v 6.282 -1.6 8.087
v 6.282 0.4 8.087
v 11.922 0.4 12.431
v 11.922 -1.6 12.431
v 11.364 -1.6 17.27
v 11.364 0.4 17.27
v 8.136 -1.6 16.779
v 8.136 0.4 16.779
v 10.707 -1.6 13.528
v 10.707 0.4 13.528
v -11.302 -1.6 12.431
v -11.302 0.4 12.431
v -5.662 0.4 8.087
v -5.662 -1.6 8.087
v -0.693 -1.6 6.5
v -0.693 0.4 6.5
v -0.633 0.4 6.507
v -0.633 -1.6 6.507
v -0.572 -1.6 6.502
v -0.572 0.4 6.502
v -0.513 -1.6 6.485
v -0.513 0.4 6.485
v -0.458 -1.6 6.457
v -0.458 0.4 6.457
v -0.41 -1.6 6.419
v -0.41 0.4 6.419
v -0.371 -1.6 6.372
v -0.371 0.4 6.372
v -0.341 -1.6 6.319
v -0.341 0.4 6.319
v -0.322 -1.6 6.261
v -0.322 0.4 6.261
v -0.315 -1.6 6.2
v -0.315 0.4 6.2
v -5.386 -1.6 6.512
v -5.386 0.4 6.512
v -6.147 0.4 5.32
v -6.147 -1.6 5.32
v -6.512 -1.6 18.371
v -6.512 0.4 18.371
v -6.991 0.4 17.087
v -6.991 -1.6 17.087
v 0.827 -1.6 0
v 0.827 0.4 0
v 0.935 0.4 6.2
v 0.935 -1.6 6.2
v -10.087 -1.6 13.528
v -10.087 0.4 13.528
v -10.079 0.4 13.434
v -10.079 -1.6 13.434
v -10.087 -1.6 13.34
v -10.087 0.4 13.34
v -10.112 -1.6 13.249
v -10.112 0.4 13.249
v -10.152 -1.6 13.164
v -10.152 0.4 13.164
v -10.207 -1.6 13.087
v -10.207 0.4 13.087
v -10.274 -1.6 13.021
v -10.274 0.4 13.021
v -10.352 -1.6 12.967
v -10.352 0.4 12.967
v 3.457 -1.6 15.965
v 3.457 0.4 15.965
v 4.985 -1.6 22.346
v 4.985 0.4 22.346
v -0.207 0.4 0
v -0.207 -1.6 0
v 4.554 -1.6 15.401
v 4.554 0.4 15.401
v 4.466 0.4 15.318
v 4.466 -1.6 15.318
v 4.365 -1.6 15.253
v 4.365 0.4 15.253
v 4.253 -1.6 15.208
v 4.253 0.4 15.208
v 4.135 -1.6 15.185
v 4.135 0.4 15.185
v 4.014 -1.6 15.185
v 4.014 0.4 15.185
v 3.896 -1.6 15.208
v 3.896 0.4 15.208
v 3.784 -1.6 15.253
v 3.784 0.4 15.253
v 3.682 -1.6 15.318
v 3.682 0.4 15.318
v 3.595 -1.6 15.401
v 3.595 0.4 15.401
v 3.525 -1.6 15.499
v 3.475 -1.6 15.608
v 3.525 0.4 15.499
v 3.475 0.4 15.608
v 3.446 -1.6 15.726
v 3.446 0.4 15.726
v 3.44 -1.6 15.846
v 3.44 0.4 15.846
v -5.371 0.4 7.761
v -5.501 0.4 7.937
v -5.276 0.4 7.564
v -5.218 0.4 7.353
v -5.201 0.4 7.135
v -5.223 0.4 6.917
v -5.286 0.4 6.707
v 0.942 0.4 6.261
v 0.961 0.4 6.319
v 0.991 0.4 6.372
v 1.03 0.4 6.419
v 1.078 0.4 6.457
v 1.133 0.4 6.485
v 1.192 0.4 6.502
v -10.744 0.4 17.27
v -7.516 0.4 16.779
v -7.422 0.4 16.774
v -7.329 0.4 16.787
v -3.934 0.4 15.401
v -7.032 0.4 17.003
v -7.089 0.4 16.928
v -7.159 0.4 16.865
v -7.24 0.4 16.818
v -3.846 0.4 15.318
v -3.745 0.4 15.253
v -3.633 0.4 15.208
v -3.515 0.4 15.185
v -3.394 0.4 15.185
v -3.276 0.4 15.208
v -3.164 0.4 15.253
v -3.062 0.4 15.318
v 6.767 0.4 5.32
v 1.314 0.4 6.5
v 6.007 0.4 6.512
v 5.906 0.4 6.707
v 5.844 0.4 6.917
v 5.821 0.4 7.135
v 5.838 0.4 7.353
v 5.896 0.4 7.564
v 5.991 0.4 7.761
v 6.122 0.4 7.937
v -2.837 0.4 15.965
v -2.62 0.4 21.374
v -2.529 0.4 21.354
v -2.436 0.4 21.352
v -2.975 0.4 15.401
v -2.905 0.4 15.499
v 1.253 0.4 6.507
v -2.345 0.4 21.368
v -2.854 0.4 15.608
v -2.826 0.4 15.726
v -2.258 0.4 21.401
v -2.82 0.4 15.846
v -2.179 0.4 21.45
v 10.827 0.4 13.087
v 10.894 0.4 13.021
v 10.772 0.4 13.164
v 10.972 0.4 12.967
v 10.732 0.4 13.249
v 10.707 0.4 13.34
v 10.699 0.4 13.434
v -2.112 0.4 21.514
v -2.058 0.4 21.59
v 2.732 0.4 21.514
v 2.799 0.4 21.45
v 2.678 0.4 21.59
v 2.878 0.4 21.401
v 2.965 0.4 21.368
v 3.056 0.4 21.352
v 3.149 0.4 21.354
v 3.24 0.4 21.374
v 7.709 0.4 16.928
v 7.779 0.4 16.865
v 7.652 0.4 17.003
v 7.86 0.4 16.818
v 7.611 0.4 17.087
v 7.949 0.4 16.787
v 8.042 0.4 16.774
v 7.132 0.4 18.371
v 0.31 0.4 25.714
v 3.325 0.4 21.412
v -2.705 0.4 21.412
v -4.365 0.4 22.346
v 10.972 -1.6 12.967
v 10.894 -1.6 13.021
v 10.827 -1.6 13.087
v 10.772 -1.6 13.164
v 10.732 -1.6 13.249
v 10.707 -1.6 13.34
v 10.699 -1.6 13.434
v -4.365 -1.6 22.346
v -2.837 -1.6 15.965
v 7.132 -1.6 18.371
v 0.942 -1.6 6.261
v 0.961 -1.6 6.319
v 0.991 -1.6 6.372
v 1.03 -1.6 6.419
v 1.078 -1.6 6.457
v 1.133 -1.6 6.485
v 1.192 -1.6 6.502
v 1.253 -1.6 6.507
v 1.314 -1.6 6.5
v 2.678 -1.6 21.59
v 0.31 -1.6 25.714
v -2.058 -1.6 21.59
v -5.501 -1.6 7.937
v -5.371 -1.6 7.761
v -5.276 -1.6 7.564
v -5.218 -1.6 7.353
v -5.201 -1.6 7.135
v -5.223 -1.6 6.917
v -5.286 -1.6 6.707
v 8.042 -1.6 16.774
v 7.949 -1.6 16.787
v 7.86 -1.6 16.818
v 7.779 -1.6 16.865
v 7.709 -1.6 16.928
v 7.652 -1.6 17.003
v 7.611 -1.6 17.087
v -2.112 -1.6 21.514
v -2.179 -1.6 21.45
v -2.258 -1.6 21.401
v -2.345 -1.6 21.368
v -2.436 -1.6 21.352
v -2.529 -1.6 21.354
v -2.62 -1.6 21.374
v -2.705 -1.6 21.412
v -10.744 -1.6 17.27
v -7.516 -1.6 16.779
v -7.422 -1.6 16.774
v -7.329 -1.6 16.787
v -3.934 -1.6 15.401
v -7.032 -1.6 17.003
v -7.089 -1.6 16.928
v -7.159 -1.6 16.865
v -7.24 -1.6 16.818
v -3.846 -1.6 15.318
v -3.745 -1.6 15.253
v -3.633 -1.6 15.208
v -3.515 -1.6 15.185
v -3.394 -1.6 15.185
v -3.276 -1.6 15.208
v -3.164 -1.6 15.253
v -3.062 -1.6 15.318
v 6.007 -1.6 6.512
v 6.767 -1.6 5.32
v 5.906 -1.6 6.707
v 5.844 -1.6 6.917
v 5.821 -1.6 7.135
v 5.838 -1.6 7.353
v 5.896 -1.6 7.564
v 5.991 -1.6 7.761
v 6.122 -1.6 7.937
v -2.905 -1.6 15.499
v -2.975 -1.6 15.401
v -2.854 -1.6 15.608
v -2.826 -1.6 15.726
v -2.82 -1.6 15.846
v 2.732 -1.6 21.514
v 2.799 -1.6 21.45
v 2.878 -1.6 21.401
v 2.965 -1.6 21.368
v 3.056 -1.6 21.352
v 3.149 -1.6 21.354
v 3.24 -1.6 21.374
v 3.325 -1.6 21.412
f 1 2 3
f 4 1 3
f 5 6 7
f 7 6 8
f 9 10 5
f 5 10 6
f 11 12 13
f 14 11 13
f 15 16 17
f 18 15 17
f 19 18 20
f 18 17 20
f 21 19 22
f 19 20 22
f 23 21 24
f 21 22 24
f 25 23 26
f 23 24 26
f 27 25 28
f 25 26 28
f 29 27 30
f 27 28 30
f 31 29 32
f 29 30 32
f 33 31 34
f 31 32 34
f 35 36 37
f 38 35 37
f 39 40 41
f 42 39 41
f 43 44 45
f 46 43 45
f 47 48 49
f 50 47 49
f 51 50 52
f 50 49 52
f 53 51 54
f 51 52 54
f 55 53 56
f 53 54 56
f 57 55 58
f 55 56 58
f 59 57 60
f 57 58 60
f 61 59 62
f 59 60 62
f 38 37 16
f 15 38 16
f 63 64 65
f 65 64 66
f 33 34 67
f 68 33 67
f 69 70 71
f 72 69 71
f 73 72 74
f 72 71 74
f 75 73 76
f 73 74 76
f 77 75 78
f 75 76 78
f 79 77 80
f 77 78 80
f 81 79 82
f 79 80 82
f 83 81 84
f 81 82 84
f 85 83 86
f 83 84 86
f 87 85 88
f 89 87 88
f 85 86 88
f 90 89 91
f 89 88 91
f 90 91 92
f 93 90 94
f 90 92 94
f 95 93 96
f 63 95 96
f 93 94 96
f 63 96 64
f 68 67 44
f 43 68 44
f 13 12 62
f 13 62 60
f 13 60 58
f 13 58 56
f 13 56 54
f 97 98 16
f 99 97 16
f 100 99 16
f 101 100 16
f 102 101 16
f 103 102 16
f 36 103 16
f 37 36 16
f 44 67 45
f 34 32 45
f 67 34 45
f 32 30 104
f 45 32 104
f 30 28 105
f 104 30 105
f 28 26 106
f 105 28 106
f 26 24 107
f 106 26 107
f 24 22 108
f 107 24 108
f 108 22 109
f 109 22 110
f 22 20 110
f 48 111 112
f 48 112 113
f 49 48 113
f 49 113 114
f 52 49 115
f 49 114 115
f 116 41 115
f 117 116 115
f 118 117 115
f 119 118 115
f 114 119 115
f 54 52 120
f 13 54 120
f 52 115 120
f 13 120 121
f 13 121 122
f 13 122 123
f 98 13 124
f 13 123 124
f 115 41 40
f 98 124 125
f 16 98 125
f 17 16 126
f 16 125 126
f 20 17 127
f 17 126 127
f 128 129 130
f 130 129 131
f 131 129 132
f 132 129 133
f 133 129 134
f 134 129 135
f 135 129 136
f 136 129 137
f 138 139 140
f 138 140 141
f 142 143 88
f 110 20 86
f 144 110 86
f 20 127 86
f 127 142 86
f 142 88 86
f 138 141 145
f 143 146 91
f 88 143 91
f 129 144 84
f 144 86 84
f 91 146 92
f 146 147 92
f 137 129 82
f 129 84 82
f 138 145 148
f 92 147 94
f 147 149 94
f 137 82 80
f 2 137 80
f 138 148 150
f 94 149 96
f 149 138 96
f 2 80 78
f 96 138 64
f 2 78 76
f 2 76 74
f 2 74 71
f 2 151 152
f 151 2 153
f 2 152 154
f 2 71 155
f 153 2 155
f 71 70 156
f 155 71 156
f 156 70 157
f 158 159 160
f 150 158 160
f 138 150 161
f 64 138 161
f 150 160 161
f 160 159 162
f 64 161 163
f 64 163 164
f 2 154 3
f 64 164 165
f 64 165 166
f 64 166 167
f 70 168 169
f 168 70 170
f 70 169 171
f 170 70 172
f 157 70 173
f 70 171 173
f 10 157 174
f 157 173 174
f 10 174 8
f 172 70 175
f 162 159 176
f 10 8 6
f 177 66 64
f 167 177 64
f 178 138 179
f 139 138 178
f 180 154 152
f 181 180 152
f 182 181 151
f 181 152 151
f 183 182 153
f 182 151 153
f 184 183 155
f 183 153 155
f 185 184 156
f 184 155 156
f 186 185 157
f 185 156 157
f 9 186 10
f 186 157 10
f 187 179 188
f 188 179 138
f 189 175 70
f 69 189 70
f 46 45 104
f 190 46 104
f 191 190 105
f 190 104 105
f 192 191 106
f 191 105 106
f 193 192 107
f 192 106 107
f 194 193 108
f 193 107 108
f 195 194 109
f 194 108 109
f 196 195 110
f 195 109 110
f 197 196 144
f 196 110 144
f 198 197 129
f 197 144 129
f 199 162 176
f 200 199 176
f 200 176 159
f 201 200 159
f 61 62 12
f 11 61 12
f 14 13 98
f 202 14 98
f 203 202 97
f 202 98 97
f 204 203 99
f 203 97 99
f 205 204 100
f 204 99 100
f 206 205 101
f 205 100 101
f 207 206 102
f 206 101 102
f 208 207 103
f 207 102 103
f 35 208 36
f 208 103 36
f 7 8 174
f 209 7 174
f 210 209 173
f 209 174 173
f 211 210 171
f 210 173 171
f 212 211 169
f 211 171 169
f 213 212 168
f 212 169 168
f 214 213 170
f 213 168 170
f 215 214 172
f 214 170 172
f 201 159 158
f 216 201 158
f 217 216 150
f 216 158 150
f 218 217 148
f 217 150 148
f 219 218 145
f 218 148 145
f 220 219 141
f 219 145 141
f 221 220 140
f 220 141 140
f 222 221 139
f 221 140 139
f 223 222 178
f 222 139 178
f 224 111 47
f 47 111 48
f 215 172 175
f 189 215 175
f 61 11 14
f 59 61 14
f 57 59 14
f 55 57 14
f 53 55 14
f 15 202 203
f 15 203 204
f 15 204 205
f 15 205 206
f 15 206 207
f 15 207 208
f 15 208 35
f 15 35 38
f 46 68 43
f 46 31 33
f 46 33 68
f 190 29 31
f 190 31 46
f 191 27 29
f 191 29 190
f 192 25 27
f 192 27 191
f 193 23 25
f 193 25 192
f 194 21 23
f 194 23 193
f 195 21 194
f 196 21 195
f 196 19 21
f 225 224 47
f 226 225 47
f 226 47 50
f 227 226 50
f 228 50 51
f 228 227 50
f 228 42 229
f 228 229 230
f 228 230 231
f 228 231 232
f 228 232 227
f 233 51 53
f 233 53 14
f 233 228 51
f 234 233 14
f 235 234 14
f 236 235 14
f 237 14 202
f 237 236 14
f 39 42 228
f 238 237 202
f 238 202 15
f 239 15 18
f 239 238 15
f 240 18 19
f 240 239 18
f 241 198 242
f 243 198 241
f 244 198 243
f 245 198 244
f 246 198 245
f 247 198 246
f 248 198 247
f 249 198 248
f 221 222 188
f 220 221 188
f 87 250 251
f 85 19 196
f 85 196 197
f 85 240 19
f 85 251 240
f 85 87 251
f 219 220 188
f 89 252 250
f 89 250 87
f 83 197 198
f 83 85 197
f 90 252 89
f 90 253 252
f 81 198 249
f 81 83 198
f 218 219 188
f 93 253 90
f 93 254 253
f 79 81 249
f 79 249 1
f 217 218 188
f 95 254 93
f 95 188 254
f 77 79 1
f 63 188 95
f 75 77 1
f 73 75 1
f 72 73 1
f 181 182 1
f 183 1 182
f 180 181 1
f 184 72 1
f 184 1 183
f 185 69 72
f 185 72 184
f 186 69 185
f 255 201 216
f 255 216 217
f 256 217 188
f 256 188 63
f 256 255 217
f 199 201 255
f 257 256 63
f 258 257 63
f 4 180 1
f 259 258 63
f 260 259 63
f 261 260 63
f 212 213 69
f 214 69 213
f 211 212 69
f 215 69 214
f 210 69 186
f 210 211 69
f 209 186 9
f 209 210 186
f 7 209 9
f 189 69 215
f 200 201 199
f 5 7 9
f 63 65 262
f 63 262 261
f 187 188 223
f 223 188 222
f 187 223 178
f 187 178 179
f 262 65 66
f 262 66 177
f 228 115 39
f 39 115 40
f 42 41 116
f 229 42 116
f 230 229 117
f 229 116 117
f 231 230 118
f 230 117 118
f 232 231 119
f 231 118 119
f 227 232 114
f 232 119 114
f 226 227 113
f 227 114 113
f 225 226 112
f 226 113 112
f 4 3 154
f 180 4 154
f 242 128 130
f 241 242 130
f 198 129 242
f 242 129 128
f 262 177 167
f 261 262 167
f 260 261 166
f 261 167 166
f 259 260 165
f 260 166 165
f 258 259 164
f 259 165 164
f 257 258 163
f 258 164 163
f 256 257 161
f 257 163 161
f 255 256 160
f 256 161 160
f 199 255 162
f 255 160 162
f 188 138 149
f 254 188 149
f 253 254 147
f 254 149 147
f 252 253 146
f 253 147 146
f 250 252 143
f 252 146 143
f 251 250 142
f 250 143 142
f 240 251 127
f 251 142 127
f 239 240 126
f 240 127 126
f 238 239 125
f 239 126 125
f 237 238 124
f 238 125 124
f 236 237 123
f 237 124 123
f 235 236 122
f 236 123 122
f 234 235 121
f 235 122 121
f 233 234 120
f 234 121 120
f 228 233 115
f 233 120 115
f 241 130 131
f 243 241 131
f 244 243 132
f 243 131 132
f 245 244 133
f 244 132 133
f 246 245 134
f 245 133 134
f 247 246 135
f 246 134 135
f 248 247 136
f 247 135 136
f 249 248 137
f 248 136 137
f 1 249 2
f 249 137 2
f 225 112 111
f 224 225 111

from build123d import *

# Parameters (mm, degrees)
F1_DEPTH = 1.6
F2_SCALE = 1.25


with BuildPart() as f1:
    # F0 (on Front) → F1 (new body)
    with BuildSketch(Plane.XZ):
        with BuildLine():
            Line((0, 0), (0.413425887, 0))
            Line((0.413425887, 0), (0.8268517741, 0))
            Line((0.8268517741, 0), (0.913425887, 4.9598276104))
            ThreePointArc((0.913425887, 4.9598276104), (1.0081087659, 5.1513941345), (1.2162387154, 5.1998142211))
            Line((1.2162387154, 5.1998142211), (5.5792679741, 4.2561256))
            Line((5.5792679741, 4.2561256), (4.9705727128, 5.2097686))
            ThreePointArc((4.9705727128, 5.2097686), (4.8360238518, 5.8823080691), (5.1909015741, 6.4692276))
            Line((5.1909015741, 6.4692276), (9.7032877741, 9.9448366))
            Line((9.7032877741, 9.9448366), (8.9429137741, 10.373741))
            ThreePointArc((8.9429137741, 10.373741), (8.7655752428, 10.5643141825), (8.7308237651, 10.8223053206))
            Line((8.7308237651, 10.8223053206), (9.2566129031, 13.8156465299))
            Line((9.2566129031, 13.8156465299), (6.6742096902, 13.4228908506))
            ThreePointArc((6.6742096902, 13.4228908506), (6.4203753707, 13.4717678019), (6.2541926873, 13.66976814))
            Line((6.2541926873, 13.66976814), (5.8709357741, 14.6970242))
            Line((5.8709357741, 14.6970242), (3.8084164021, 12.3209425283))
            ThreePointArc((3.8084164021, 12.3209425283), (3.1924630132, 12.2021834474), (2.9307614756, 12.7722839665))
            Line((2.9307614756, 12.7722839665), (4.1535767314, 17.8771898961))
            Line((4.1535767314, 17.8771898961), (2.8251496269, 17.1293843238))
            ThreePointArc((2.8251496269, 17.1293843238), (2.5371995805, 17.0940398171), (2.3078402562, 17.2716876815))
            Line((2.3078402562, 17.2716876815), (0.413425887, 20.5711957021))
            Line((0.413425887, 20.5711957021), (-1.4809884821, 17.2716876815))
            ThreePointArc((-1.4809884821, 17.2716876815), (-1.7103478064, 17.0940398171), (-1.9982978528, 17.1293843238))
            Line((-1.9982978528, 17.1293843238), (-3.3267249573, 17.8771898961))
            Line((-3.3267249573, 17.8771898961), (-2.1039097015, 12.7722839665))
            ThreePointArc((-2.1039097015, 12.7722839665), (-2.3656112391, 12.2021834474), (-2.9815646281, 12.3209425283))
            Line((-2.9815646281, 12.3209425283), (-5.044084, 14.6970242))
            Line((-5.044084, 14.6970242), (-5.4273409133, 13.66976814))
            ThreePointArc((-5.4273409133, 13.66976814), (-5.5935235967, 13.4717678019), (-5.8473579162, 13.4228908506))
            Line((-5.8473579162, 13.4228908506), (-8.4297611291, 13.8156465299))
            Line((-8.4297611291, 13.8156465299), (-7.903971991, 10.8223053206))
            ThreePointArc((-7.903971991, 10.8223053206), (-7.9387234687, 10.5643141825), (-8.116062, 10.373741))
            Line((-8.116062, 10.373741), (-8.876436, 9.9448366))
            Line((-8.876436, 9.9448366), (-4.3640498, 6.4692276))
            ThreePointArc((-4.3640498, 6.4692276), (-4.0091720777, 5.8823080691), (-4.1437209388, 5.2097686))
            Line((-4.1437209388, 5.2097686), (-4.7524162, 4.2561256))
            Line((-4.7524162, 4.2561256), (-0.3893869413, 5.1998142211))
            ThreePointArc((-0.3893869413, 5.1998142211), (-0.1812569918, 5.1513941345), (-0.086574113, 4.9598276104))
            Line((-0.086574113, 4.9598276104), (0, 0))
        make_face()
    extrude(amount=F1_DEPTH)


with BuildPart() as f1_1:
    # F2: moved
    add(f1.part.scale(F2_SCALE).moved(Location((-0.2067129435, 0.4, 0))))


solid = f1_1.part
